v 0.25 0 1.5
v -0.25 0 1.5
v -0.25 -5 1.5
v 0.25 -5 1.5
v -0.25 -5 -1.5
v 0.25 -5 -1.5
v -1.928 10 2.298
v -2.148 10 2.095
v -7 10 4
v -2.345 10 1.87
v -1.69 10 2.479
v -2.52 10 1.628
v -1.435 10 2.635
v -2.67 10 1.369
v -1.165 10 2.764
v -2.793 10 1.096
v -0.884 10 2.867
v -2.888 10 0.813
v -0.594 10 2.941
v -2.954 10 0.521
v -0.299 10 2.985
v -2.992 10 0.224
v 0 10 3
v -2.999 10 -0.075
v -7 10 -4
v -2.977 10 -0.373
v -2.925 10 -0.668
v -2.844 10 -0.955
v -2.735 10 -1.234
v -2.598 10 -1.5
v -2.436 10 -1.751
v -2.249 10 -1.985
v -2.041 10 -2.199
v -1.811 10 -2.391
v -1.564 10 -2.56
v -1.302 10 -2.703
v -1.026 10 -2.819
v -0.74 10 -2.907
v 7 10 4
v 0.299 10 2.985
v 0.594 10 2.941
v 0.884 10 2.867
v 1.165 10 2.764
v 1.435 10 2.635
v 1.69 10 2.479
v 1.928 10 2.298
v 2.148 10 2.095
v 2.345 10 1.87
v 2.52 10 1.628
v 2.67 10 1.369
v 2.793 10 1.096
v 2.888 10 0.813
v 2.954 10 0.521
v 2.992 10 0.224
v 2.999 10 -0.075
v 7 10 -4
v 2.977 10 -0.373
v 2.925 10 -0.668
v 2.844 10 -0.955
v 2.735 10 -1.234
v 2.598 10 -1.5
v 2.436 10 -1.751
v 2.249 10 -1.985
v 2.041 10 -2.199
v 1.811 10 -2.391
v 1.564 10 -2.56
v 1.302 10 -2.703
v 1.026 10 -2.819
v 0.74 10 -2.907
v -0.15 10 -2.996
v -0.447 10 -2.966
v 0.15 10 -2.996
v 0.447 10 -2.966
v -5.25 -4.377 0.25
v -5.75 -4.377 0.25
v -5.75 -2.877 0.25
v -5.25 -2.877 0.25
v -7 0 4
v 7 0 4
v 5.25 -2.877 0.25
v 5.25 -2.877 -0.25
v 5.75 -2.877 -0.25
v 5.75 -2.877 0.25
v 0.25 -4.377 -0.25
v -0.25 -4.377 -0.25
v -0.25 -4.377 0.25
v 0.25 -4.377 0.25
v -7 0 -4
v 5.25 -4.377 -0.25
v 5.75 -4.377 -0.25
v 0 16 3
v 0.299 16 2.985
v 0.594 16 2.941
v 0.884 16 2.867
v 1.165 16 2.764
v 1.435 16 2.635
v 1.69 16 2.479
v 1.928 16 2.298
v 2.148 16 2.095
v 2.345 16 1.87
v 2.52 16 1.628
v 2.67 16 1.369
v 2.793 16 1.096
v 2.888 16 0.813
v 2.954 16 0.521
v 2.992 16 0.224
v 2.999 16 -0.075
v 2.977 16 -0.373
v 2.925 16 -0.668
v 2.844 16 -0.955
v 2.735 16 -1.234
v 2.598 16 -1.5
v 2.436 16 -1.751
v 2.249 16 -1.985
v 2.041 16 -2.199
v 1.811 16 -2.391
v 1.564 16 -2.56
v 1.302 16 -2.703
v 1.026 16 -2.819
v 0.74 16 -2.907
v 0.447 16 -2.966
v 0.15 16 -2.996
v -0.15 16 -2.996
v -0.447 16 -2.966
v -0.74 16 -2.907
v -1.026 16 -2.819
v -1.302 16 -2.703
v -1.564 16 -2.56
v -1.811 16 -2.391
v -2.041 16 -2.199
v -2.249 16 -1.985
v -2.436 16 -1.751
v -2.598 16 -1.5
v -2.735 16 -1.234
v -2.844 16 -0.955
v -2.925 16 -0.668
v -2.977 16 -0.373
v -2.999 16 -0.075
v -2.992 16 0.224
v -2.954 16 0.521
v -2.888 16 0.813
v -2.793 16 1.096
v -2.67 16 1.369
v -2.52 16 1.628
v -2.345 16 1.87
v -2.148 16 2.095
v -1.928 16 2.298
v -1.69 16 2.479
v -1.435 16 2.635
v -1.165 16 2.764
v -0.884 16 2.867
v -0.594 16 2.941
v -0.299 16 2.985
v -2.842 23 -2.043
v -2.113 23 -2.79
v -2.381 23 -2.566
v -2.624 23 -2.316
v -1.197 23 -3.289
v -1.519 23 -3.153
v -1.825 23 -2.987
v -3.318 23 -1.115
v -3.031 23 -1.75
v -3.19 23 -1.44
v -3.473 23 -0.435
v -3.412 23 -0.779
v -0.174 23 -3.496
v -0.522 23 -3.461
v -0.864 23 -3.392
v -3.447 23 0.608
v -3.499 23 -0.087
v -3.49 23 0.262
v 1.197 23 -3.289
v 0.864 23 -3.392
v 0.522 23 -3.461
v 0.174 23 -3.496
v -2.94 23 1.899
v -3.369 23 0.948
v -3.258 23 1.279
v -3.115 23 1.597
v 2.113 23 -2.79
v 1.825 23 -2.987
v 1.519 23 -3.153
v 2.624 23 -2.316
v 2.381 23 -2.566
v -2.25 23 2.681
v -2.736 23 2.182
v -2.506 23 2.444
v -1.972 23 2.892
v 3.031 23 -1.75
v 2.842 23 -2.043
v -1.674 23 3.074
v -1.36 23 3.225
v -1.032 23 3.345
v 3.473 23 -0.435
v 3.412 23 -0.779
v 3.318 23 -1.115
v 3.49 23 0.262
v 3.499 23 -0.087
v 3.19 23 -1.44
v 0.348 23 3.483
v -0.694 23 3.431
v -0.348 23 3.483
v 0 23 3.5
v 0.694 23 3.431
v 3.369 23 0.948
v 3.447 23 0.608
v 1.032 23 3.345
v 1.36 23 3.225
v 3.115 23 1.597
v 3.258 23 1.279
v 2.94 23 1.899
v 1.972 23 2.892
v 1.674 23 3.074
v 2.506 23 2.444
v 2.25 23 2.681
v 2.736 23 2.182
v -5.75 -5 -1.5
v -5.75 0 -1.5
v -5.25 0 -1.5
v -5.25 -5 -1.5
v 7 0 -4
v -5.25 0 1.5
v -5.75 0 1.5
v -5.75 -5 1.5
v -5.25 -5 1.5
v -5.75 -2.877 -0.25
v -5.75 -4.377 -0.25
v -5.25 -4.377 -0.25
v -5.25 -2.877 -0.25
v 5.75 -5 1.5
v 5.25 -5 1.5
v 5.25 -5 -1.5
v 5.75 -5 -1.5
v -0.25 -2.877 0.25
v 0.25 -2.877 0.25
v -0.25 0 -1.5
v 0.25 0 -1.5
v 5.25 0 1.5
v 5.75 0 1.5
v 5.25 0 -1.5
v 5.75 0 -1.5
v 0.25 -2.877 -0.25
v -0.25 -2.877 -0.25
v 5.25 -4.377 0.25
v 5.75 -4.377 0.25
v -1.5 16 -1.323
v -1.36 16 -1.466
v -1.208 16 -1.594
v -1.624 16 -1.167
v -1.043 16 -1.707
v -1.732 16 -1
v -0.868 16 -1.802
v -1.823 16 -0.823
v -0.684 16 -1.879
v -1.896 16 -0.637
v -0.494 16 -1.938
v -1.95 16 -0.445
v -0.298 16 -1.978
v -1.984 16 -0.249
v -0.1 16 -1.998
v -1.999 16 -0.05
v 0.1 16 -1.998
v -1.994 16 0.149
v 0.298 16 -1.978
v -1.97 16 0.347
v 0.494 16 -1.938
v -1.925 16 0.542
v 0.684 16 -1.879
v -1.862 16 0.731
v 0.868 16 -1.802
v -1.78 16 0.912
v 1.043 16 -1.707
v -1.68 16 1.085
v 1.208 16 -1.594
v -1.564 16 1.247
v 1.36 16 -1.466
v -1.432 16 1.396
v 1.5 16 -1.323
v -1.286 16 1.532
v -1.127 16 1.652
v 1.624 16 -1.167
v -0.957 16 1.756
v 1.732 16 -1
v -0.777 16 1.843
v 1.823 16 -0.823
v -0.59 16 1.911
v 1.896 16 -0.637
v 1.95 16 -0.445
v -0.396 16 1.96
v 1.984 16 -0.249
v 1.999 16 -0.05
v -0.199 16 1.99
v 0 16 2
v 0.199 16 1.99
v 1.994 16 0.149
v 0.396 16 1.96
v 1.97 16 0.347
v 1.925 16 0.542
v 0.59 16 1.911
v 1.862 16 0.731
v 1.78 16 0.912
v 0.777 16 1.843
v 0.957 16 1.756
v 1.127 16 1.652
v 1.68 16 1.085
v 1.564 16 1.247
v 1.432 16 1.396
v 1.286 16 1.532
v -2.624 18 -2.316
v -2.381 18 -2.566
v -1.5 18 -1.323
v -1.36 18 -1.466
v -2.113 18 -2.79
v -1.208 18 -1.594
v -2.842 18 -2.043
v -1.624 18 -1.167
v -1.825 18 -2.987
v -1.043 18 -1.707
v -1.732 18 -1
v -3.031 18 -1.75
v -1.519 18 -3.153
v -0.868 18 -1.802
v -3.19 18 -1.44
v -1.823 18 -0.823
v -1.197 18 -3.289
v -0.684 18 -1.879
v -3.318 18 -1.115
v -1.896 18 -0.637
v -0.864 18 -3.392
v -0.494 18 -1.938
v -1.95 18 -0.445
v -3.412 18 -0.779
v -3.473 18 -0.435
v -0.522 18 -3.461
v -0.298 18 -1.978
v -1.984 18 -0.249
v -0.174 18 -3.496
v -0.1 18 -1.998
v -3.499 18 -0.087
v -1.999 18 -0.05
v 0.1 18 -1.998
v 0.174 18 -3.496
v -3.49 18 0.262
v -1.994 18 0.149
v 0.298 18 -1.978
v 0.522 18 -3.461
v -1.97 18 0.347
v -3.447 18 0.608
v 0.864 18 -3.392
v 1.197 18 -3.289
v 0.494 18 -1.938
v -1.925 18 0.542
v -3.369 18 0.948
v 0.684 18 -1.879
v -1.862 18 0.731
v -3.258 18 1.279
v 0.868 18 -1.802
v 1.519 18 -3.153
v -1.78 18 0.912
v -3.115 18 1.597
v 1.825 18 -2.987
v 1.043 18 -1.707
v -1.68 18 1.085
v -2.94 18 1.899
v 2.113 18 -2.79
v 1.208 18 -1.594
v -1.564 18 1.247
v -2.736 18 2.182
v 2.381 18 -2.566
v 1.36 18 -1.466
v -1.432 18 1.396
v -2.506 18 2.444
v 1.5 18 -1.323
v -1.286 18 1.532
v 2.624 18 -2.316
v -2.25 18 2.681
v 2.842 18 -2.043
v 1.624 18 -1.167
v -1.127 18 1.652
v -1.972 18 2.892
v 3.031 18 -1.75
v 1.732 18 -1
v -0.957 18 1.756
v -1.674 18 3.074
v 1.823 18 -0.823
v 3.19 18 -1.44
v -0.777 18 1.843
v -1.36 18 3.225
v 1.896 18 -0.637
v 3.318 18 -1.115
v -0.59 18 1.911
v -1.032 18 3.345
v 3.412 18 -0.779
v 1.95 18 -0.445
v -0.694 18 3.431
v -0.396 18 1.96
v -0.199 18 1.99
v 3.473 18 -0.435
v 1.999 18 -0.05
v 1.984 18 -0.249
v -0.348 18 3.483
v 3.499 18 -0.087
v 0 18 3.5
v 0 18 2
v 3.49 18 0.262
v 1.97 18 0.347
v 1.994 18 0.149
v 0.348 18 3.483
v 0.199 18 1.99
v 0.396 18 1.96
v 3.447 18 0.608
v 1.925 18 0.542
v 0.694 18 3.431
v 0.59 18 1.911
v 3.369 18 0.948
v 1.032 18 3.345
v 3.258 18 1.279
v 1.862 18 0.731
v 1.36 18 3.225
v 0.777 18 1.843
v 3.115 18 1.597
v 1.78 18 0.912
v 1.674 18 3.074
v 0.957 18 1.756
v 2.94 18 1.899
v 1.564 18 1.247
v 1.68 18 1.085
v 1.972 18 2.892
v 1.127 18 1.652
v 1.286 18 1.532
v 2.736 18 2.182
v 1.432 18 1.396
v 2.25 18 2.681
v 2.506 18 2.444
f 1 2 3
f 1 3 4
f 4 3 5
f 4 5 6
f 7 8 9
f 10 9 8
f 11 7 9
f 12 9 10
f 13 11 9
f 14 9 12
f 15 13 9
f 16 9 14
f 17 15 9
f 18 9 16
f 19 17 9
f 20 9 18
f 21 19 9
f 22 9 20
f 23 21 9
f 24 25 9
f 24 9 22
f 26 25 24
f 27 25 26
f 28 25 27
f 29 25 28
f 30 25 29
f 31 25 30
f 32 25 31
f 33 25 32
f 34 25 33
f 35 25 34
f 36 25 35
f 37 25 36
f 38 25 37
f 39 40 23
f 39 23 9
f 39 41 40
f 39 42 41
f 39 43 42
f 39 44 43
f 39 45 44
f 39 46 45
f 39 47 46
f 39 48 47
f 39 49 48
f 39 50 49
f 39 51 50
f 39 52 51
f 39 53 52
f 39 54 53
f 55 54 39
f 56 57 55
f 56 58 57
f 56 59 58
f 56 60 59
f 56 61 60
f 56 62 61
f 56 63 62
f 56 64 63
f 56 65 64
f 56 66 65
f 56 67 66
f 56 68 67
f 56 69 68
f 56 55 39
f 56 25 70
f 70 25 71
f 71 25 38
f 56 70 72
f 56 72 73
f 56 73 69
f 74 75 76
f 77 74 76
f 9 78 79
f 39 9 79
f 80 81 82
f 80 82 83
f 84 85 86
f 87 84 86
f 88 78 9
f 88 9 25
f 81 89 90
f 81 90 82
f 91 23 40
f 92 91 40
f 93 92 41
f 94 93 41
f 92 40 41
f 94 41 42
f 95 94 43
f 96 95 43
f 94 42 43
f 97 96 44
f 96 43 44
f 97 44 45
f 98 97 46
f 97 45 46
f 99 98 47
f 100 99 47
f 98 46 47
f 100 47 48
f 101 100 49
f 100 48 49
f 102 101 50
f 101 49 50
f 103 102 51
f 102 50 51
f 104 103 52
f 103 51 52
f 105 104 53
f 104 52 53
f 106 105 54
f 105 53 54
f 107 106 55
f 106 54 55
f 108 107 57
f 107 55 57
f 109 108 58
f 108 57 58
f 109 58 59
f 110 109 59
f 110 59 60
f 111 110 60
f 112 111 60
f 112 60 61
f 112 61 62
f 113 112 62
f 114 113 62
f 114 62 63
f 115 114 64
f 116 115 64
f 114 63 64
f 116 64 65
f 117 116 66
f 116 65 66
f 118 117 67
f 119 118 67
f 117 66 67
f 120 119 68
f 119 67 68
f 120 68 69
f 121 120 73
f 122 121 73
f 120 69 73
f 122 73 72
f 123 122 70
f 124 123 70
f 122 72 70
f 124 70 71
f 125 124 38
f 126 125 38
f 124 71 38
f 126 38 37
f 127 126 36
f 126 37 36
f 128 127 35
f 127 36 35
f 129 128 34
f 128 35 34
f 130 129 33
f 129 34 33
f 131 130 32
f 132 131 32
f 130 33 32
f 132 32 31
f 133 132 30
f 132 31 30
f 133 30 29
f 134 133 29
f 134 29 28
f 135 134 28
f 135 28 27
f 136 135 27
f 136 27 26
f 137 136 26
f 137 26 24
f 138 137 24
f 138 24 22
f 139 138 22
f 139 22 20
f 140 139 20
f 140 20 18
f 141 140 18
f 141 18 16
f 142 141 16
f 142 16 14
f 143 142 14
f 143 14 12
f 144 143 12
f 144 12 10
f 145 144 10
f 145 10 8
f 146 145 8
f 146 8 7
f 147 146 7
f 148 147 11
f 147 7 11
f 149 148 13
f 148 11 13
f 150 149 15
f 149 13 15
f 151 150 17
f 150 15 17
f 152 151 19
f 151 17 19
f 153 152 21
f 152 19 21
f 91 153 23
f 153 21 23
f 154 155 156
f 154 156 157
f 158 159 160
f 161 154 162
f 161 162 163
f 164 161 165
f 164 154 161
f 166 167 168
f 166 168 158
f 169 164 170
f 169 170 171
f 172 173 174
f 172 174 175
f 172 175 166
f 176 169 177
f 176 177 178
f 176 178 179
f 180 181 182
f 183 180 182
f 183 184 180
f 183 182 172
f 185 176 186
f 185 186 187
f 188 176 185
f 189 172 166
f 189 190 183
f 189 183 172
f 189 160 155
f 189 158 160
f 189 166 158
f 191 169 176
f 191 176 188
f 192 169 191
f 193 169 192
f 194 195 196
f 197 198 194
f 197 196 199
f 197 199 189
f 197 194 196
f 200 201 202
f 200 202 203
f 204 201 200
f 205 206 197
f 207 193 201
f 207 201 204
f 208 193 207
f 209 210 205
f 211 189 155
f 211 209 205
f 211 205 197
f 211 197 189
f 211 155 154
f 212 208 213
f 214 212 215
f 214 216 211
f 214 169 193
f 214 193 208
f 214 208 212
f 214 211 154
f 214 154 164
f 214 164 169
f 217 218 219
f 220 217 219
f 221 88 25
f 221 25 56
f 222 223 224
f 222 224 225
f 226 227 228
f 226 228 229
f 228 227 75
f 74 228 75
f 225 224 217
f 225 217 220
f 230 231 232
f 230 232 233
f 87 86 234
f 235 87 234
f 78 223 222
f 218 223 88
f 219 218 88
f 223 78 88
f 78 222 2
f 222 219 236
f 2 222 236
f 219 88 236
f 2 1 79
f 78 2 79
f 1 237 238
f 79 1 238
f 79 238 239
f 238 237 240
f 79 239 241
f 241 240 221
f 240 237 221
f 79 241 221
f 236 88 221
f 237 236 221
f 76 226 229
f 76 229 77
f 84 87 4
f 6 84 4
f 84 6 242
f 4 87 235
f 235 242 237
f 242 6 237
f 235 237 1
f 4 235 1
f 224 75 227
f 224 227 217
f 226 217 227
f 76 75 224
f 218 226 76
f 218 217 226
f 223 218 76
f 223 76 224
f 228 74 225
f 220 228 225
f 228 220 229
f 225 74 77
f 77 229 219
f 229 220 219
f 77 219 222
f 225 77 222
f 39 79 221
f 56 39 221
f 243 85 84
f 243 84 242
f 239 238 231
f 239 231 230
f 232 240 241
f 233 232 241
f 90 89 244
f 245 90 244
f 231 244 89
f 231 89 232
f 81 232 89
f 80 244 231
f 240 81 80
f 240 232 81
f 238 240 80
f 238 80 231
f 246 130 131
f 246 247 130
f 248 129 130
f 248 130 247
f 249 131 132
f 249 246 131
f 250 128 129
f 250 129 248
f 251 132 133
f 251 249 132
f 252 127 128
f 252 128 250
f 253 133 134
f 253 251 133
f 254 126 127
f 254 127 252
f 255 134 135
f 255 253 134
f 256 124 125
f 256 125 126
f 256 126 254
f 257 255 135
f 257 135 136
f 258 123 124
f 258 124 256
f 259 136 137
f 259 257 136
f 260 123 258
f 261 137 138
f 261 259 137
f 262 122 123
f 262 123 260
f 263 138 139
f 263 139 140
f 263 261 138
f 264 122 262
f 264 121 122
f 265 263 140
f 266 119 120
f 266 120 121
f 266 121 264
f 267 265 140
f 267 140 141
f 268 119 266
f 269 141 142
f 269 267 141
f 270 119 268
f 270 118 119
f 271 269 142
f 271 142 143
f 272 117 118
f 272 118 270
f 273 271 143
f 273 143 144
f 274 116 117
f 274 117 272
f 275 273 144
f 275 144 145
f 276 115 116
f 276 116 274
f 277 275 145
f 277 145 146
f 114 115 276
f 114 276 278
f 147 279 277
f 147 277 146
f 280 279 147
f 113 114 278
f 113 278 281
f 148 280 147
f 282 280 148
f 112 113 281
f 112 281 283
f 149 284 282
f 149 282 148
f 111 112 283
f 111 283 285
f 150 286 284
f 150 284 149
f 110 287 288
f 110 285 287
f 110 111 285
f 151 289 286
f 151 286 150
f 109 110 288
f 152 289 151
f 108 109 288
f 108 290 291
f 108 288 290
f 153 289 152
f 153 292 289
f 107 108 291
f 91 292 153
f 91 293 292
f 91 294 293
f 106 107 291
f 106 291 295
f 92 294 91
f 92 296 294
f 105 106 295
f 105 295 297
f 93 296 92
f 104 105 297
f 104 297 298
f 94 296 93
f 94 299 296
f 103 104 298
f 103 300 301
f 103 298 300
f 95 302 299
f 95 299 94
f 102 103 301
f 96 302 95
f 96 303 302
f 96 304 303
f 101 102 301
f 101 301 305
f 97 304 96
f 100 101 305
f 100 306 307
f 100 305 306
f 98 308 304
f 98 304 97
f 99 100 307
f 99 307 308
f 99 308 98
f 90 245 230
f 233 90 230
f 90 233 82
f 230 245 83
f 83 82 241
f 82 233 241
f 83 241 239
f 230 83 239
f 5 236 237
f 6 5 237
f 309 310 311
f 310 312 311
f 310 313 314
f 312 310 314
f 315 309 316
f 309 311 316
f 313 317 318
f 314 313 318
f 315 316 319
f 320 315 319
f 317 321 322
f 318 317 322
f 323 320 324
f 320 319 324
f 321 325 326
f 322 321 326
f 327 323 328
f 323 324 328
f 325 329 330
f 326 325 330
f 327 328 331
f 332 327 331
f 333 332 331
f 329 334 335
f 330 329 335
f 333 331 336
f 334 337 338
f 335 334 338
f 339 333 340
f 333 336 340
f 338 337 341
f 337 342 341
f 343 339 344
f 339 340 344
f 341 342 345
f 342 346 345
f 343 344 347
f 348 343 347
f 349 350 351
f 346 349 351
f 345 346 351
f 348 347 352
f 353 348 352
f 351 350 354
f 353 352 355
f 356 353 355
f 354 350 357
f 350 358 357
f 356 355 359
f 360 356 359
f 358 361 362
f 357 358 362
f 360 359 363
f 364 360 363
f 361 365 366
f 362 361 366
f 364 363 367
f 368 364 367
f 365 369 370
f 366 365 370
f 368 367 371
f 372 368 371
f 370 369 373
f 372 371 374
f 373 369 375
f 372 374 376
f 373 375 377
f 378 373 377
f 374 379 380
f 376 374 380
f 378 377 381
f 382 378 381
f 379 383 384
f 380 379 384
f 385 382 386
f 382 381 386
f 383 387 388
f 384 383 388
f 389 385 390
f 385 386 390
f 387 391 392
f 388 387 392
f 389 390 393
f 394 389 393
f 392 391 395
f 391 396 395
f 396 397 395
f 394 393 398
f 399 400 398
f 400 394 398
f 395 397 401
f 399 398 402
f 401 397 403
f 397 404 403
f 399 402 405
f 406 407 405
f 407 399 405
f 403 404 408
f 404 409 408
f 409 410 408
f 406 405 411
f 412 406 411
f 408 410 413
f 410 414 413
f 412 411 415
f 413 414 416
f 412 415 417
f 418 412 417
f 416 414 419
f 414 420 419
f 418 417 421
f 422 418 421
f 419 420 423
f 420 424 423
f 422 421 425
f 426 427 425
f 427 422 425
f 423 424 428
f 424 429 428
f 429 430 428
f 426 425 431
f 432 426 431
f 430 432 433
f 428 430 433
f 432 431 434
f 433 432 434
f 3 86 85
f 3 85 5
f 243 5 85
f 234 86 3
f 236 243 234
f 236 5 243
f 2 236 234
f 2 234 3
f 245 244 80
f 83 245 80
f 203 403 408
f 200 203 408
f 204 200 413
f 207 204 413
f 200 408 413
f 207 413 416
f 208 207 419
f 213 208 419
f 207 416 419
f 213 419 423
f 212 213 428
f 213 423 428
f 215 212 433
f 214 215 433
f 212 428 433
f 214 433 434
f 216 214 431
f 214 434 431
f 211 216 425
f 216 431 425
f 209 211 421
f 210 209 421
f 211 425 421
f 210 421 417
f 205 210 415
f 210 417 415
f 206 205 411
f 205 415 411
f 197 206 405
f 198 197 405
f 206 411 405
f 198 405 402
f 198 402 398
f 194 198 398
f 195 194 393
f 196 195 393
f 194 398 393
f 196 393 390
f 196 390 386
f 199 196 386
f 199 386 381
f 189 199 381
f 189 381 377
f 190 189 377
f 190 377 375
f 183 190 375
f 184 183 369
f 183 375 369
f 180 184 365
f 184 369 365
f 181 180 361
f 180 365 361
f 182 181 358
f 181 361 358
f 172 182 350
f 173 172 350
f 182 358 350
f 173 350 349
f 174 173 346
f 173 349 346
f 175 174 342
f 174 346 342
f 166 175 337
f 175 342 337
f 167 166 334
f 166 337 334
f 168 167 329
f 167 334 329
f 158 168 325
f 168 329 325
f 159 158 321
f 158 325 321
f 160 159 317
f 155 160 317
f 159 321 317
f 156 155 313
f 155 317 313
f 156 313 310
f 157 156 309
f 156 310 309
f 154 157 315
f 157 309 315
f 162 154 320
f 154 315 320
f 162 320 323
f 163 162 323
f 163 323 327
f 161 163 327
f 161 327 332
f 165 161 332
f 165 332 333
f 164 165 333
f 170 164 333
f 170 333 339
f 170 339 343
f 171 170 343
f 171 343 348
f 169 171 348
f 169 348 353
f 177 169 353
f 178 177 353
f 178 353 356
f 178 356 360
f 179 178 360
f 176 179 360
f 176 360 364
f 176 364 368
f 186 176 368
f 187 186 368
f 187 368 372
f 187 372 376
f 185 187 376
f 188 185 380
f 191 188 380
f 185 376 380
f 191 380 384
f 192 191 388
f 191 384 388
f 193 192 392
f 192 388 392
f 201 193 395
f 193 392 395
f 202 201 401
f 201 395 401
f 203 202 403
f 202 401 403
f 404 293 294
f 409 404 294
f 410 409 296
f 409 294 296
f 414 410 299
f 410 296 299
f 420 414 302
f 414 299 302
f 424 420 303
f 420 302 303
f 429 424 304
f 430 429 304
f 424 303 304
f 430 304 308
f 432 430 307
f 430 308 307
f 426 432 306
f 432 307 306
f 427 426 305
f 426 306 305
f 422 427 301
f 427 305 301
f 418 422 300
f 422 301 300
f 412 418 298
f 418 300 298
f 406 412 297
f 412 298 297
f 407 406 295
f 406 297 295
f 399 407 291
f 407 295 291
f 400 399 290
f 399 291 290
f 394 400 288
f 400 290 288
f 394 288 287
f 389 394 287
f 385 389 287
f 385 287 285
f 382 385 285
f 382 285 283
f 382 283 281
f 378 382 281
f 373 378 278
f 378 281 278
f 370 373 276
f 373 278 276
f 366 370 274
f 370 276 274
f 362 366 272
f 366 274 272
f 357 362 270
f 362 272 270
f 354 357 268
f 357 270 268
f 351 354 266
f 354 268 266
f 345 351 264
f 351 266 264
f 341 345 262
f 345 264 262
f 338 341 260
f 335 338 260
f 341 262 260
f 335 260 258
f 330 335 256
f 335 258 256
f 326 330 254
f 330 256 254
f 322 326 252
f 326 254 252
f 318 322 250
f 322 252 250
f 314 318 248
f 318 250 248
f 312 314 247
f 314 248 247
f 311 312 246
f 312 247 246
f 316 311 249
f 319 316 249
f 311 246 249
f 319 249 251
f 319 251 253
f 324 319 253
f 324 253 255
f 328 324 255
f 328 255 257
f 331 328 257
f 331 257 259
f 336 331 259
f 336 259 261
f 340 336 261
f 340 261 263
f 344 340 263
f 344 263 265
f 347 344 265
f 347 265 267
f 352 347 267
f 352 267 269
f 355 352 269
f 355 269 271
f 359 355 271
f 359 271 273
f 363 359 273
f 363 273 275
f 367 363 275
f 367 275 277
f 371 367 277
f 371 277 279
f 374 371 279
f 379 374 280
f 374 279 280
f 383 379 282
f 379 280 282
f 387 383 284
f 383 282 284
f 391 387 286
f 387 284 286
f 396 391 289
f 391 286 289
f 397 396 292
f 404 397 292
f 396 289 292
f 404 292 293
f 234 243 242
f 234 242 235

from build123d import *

# Parameters (mm, degrees)
SKETCH2_W          = 14
SKETCH2_H          = 8
EXTRUDE1_DEPTH     = 10
SKETCH3_R          = 3
EXTRUDE2_DEPTH     = 6
SKETCH4_R          = 2
EXTRUDE3_DEPTH     = 2
SKETCH5_R          = 3.5
EXTRUDE4_DEPTH     = 5
SKETCH6_W          = 0.5
SKETCH6_H          = 3
EXTRUDE5_DEPTH     = 5
SKETCH7_W          = 0.5
SKETCH7_H          = 3
EXTRUDE6_DEPTH     = 5
SKETCH8_W          = 0.5
SKETCH8_H          = 3
EXTRUDE7_DEPTH     = 5
SKETCH9_W          = 0.5
SKETCH9_H          = 1.5
CUT_EXTRUDE1_DEPTH = 27.600046992


with BuildPart() as part:
    # Sketch2 → Extrude1 (new body)
    with BuildSketch(Plane(origin=(0, 0, 0), x_dir=(1, 0, 0), z_dir=(0, 1, 0))):
        Rectangle(SKETCH2_W, SKETCH2_H)
    extrude(amount=EXTRUDE1_DEPTH)

    # Sketch3 → Extrude2 (add)
    with BuildSketch(Plane(origin=(0, 10, 0), x_dir=(-1, 0, 0), z_dir=(0, 1, 0))):
        with Locations(Location((0, 0, 0), (0, 0, 90))):
            Circle(SKETCH3_R)
    extrude(amount=EXTRUDE2_DEPTH)

    # Sketch4 → Extrude3 (add)
    with BuildSketch(Plane(origin=(0, 16, 0), x_dir=(-1, 0, 0), z_dir=(0, 1, 0))):
        with Locations(Location((0, 0, 0), (0, 0, 90))):
            Circle(SKETCH4_R)
    extrude(amount=EXTRUDE3_DEPTH)

    # Sketch5 → Extrude4 (add)
    with BuildSketch(Plane(origin=(0, 18, 0), x_dir=(-1, 0, 0), z_dir=(0, 1, 0))):
        with Locations(Location((0, 0, 0), (0, 0, 90))):
            Circle(SKETCH5_R)
    extrude(amount=EXTRUDE4_DEPTH)

    # Sketch6 → Extrude5 (add)
    with BuildSketch(Plane.XZ):
        Rectangle(SKETCH6_W, SKETCH6_H)
    extrude(amount=EXTRUDE5_DEPTH)

    # Sketch7 → Extrude6 (add)
    with BuildSketch(Plane.XZ):
        with Locations((5.5, 0)):
            Rectangle(SKETCH7_W, SKETCH7_H)
    extrude(amount=EXTRUDE6_DEPTH)

    # Sketch8 → Extrude7 (add)
    with BuildSketch(Plane.XZ):
        with Locations((-5.5, 0)):
            Rectangle(SKETCH8_W, SKETCH8_H)
    extrude(amount=EXTRUDE7_DEPTH)

    # Sketch9 → Cut-Extrude1 (cut, through all)
    with BuildSketch(Plane.ZY.offset(5.75)):
        with Locations((0, -3.626725107)):
            Rectangle(SKETCH9_W, SKETCH9_H)
    extrude(amount=-CUT_EXTRUDE1_DEPTH, mode=Mode.SUBTRACT)


solid = part.part
